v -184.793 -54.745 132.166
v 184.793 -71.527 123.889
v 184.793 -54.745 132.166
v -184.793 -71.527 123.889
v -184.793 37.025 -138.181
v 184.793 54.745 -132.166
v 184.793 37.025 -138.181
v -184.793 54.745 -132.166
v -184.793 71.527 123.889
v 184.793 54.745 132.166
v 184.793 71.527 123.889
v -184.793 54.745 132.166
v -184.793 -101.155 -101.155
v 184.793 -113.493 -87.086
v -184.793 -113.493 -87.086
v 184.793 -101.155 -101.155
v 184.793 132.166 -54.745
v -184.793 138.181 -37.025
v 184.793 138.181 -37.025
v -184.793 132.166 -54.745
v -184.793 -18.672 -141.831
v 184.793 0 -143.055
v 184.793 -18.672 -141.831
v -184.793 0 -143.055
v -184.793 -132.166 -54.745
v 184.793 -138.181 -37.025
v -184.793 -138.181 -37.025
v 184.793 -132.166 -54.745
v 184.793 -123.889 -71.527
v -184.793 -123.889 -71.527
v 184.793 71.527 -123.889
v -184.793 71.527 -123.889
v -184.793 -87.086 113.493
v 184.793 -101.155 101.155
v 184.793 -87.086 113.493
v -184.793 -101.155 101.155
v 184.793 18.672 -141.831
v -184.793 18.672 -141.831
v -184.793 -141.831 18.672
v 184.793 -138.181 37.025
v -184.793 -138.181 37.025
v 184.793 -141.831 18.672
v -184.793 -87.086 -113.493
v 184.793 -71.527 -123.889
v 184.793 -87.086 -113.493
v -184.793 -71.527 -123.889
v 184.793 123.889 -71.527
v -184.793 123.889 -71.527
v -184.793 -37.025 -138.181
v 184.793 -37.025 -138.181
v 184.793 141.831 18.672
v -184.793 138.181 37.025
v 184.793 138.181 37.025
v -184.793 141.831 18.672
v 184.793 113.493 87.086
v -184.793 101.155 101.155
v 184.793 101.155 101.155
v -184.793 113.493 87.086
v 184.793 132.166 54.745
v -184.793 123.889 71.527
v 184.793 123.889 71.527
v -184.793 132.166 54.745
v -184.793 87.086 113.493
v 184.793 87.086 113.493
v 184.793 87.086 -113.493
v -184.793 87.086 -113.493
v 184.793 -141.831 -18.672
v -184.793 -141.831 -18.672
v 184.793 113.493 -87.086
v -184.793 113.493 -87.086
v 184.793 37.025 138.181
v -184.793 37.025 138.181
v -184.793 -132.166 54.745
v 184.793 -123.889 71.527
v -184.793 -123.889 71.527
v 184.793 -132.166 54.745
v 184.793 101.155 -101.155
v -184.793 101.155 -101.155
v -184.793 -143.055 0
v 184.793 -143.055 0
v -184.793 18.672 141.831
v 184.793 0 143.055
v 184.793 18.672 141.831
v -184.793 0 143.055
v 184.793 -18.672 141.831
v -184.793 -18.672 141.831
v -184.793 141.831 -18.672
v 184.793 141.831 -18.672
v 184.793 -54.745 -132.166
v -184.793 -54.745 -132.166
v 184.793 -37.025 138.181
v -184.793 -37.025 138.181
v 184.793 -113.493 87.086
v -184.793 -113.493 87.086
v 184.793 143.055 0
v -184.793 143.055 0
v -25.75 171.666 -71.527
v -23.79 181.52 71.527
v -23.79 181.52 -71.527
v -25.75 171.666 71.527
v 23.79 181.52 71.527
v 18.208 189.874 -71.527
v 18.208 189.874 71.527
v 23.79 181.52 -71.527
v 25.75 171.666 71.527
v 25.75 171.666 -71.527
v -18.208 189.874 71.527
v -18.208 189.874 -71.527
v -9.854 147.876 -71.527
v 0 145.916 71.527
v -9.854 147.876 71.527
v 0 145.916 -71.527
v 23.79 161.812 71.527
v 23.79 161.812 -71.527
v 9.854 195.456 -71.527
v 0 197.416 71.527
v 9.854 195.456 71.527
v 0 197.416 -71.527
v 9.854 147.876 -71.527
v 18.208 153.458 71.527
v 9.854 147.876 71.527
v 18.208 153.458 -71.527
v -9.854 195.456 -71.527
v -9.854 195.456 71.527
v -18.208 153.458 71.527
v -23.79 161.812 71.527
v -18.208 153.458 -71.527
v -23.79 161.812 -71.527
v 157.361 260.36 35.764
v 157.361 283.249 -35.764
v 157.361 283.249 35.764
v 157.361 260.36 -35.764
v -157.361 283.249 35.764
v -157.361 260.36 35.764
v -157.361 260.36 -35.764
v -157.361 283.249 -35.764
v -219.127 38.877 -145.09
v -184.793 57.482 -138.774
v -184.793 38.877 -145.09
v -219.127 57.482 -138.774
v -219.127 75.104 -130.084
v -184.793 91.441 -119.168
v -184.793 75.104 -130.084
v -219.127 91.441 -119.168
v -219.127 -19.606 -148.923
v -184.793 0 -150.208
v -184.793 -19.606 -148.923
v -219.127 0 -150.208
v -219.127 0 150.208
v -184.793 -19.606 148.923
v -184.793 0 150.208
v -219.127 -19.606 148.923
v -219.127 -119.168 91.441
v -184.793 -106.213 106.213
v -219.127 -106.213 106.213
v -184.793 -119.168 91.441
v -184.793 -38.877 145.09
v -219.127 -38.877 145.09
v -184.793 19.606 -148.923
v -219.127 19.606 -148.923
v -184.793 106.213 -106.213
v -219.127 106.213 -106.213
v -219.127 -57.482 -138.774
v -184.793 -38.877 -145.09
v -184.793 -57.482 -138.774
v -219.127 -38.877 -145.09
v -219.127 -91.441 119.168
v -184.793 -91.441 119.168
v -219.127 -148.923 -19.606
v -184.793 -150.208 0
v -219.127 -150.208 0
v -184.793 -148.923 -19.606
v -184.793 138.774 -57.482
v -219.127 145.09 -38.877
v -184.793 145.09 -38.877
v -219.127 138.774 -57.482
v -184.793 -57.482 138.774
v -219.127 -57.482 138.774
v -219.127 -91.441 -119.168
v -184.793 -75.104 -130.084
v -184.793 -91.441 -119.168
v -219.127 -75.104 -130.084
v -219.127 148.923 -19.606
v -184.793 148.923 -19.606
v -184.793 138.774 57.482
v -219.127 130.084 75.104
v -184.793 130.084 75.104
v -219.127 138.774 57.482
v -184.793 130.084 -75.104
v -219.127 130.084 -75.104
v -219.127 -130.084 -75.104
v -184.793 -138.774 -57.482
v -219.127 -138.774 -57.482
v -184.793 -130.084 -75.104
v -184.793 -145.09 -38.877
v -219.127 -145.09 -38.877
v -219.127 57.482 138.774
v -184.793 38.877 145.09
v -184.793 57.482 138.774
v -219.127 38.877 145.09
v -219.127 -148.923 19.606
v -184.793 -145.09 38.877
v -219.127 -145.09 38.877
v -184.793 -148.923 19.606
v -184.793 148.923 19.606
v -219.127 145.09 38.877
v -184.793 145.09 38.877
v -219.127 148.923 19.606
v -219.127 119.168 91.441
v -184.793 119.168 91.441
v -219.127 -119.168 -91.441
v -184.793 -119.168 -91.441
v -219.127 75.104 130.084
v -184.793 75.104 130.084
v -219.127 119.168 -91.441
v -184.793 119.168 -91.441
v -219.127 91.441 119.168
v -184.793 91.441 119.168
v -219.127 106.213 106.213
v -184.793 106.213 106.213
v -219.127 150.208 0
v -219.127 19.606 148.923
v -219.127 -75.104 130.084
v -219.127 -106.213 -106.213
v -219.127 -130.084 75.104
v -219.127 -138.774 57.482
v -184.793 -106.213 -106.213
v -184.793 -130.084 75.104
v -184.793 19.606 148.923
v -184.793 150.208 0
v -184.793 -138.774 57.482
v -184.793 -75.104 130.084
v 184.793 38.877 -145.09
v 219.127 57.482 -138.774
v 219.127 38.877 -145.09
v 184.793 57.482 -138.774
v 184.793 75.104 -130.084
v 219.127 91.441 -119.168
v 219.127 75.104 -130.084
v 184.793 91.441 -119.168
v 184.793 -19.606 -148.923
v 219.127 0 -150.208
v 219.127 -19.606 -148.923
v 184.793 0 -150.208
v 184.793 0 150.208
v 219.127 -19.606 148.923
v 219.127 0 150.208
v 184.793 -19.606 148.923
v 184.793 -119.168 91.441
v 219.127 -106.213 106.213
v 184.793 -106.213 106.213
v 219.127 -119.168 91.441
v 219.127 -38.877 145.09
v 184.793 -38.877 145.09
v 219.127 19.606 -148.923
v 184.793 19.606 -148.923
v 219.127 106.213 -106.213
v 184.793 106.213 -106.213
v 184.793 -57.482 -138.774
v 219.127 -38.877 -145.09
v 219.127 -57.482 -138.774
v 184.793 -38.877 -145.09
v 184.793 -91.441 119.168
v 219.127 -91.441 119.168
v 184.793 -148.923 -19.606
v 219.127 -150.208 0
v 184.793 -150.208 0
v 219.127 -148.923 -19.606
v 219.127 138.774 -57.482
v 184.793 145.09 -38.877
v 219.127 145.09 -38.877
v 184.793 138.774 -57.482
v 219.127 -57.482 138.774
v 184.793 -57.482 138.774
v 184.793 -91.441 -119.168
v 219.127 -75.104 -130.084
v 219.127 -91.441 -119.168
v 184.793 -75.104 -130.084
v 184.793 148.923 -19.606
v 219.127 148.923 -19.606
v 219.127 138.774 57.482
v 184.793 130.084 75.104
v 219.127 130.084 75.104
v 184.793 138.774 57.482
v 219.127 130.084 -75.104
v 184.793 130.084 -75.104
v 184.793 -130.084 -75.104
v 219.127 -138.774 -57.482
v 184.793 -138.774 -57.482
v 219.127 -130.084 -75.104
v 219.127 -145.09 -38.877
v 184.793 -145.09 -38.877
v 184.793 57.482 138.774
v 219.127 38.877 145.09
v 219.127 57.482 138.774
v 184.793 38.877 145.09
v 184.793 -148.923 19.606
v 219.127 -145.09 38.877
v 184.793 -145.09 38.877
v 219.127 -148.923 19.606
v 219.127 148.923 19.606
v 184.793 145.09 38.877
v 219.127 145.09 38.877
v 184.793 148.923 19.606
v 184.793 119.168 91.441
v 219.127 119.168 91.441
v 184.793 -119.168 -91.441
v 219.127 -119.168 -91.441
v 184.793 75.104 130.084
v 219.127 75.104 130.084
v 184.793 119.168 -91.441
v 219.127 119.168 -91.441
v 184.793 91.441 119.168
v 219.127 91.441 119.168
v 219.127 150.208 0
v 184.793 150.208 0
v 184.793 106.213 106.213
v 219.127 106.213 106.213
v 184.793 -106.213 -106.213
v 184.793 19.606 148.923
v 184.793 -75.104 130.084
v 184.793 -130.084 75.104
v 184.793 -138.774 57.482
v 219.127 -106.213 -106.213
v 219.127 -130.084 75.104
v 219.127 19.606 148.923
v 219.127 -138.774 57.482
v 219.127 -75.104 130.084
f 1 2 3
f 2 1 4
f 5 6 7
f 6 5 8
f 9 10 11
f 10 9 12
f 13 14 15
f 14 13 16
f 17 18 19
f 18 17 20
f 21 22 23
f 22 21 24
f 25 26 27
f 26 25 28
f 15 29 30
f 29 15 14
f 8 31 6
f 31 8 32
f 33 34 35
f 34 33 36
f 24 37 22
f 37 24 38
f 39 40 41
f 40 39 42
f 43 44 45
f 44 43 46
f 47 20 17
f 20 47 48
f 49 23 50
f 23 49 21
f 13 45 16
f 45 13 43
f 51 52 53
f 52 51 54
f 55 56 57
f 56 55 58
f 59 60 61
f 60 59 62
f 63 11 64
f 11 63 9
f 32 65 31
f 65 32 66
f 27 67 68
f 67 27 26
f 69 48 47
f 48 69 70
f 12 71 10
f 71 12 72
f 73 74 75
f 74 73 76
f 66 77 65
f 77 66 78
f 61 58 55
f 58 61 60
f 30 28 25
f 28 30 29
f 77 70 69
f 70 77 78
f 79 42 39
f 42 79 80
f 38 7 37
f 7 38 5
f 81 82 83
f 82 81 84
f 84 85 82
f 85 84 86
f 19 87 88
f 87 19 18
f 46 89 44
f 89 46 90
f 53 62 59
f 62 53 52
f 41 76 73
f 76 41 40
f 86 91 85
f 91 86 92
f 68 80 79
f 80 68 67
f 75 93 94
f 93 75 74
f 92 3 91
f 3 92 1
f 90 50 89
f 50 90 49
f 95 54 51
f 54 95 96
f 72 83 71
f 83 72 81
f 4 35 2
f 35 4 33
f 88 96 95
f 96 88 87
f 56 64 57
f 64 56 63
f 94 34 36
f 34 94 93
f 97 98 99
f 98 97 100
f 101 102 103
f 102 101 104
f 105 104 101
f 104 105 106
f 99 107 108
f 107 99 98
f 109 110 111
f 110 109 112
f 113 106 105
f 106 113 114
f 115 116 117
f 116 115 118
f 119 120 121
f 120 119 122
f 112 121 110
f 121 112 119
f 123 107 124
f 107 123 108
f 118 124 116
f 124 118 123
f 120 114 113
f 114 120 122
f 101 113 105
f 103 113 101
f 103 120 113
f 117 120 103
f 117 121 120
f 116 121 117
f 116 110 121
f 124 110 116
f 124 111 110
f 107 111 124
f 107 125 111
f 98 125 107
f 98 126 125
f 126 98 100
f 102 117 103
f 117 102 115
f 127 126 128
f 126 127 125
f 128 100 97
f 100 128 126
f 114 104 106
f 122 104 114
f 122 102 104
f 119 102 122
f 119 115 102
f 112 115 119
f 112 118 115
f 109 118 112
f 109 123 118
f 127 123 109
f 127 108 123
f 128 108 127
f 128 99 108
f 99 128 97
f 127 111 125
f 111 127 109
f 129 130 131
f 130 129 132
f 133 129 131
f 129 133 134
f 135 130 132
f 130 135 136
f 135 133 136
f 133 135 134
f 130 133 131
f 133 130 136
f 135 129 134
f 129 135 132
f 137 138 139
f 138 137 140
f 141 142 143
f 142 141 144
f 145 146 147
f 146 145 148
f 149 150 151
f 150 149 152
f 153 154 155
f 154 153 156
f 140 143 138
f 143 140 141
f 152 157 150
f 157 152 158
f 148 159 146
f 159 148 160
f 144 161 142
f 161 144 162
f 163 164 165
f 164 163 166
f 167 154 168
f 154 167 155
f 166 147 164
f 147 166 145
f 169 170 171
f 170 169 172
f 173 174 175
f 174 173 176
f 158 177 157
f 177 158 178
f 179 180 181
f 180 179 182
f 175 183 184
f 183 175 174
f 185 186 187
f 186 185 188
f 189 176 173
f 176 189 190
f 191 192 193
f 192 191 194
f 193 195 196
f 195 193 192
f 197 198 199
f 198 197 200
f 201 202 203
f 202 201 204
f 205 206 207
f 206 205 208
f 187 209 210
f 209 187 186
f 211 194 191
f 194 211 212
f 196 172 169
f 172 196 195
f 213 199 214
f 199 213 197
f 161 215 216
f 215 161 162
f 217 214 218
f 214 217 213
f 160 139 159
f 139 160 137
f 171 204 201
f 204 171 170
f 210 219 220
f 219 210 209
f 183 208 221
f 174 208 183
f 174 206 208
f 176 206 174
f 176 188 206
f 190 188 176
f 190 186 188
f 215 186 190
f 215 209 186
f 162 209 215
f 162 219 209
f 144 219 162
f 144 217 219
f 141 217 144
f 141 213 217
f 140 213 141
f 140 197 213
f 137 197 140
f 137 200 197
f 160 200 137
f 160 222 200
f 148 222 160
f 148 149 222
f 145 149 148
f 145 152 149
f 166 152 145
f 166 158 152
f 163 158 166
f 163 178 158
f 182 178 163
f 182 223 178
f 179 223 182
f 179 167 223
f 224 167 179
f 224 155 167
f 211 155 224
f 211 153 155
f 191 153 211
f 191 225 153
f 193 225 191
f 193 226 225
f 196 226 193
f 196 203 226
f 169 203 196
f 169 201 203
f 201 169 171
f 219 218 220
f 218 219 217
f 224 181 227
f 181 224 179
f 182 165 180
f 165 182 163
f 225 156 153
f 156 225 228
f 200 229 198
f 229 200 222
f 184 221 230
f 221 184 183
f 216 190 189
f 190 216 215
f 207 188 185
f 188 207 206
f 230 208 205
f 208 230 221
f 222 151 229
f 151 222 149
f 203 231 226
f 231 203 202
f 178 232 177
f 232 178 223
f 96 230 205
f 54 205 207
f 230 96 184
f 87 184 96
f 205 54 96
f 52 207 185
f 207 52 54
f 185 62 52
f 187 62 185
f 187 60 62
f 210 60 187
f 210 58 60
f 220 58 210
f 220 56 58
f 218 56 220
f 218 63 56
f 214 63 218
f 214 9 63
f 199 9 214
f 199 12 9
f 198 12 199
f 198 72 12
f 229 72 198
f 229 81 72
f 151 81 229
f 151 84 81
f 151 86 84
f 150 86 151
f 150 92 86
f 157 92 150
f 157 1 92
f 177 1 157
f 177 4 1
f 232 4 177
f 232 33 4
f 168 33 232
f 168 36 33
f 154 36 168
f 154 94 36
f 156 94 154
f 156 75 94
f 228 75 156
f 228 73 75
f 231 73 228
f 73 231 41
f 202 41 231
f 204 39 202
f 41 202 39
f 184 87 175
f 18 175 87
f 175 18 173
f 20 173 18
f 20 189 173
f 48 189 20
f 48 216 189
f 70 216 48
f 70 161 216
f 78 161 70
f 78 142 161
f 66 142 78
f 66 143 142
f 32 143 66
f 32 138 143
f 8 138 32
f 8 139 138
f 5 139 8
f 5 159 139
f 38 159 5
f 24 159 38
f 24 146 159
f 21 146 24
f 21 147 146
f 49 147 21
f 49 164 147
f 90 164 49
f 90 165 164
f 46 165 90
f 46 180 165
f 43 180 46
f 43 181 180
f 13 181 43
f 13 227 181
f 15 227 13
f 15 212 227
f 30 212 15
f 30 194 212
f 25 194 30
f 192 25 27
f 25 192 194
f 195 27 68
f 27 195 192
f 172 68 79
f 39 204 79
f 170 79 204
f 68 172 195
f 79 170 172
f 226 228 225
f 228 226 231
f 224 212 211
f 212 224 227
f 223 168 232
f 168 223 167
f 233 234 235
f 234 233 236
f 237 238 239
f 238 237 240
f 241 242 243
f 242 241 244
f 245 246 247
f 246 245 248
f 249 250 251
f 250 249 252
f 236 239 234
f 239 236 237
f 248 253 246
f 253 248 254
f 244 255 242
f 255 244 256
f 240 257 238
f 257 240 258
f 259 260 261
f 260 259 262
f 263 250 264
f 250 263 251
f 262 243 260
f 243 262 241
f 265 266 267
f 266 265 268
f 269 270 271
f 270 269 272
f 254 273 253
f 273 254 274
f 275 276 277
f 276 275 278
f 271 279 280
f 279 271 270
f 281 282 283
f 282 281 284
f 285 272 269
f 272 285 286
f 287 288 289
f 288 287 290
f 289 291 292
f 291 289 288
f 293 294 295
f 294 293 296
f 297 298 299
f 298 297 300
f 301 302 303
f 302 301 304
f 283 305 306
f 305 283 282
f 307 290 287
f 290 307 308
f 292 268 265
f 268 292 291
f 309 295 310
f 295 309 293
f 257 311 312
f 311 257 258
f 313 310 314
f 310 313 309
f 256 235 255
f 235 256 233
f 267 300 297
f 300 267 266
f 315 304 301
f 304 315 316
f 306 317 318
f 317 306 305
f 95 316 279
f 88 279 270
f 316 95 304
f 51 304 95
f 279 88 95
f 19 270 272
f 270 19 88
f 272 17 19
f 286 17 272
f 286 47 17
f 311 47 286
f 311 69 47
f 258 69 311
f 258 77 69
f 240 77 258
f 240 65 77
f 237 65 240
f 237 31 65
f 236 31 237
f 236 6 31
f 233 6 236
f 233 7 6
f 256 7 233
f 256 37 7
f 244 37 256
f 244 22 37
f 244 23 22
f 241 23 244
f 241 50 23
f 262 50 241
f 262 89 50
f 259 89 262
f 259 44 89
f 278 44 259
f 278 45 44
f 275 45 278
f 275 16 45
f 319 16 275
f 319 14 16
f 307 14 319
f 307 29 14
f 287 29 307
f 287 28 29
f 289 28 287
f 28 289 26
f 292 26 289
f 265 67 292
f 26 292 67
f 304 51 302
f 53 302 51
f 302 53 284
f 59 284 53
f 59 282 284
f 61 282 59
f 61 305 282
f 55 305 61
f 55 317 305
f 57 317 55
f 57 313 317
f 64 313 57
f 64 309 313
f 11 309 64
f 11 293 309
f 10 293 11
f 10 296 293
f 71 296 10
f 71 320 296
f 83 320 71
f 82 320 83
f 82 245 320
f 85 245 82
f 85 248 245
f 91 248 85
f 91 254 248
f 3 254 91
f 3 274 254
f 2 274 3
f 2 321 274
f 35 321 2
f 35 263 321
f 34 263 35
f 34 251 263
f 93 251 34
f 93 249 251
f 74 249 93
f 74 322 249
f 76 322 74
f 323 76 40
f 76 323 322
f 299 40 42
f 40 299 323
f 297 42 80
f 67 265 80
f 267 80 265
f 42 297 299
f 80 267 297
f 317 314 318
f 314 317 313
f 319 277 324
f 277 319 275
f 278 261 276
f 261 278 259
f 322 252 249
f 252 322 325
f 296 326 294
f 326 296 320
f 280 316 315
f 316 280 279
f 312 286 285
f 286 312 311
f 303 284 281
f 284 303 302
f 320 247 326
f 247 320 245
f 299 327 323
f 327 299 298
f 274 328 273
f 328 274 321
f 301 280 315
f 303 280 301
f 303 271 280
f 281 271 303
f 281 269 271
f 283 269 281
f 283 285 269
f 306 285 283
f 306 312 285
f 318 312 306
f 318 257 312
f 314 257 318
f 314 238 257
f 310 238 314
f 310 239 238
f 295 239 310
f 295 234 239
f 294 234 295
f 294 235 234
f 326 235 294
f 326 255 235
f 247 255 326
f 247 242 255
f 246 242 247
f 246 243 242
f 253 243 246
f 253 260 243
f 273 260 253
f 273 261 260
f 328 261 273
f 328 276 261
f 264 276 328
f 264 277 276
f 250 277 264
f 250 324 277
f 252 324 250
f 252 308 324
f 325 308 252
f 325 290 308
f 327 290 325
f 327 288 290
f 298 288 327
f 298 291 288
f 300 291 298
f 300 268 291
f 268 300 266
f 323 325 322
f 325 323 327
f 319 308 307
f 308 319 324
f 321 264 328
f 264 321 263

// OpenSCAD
// Auto-generated by scripts/author_from_manifest.py (Phase D.3).
// Source: data/phase_d_manifest.json (sku_intent='viking-model-g-preaction-6in').
// Do not hand-edit — regenerate from the manifest.
//
// @part viking_model_g_preaction_6in
// @kind valve
// @category valve.preaction
// @display-name "Viking Model G Preaction Valve 6\""
// @mfg viking_group
// @mfg-pn Model_G
// @listing UL FM
// @price-usd 1950.00
// @install-minutes 90
// @crew foreman
// @param size_in number default=6 label="Size" unit="in"
// @port inlet position=[-0.05,0,0] direction=[-1,0,0] style=grooved size_in=6 role=run_a
// @port outlet position=[0.05,0,0] direction=[1,0,0] style=grooved size_in=6 role=run_b

size_in = 6.0;

function od_mm(nps) =
    nps ==   1  ? 33.4 :
    nps == 1.25 ? 42.2 :
    nps == 1.5  ? 48.3 :
    nps ==   2  ? 60.3 :
    nps == 2.5  ? 73.0 :
    nps ==   3  ? 88.9 :
    nps ==   4  ? 114.3 :
    nps ==   6  ? 168.3 :
    nps ==   8  ? 219.1 : 73.0;

od = od_mm(size_in);
body_len = od * 2.4;
body_d   = od * 1.7;

union() {
    // Valve body
    rotate([0, 90, 0])
        cylinder(h = body_len, d = body_d, center = true, $fn = 48);
    // Stem / handle indicator
    translate([0, body_d * 0.6, 0])
        cylinder(h = body_d * 0.5, d = body_d * 0.18, center = true, $fn = 16);
    translate([0, body_d * 0.95, 0])
        cube([body_d * 1.1, body_d * 0.08, body_d * 0.25], center = true);
    // End flanges
    translate([-body_len/2, 0, 0])
        rotate([0, 90, 0])
        cylinder(h = body_d * 0.12, d = body_d * 1.05, center = true, $fn = 48);
    translate([ body_len/2, 0, 0])
        rotate([0, 90, 0])
        cylinder(h = body_d * 0.12, d = body_d * 1.05, center = true, $fn = 48);
}
